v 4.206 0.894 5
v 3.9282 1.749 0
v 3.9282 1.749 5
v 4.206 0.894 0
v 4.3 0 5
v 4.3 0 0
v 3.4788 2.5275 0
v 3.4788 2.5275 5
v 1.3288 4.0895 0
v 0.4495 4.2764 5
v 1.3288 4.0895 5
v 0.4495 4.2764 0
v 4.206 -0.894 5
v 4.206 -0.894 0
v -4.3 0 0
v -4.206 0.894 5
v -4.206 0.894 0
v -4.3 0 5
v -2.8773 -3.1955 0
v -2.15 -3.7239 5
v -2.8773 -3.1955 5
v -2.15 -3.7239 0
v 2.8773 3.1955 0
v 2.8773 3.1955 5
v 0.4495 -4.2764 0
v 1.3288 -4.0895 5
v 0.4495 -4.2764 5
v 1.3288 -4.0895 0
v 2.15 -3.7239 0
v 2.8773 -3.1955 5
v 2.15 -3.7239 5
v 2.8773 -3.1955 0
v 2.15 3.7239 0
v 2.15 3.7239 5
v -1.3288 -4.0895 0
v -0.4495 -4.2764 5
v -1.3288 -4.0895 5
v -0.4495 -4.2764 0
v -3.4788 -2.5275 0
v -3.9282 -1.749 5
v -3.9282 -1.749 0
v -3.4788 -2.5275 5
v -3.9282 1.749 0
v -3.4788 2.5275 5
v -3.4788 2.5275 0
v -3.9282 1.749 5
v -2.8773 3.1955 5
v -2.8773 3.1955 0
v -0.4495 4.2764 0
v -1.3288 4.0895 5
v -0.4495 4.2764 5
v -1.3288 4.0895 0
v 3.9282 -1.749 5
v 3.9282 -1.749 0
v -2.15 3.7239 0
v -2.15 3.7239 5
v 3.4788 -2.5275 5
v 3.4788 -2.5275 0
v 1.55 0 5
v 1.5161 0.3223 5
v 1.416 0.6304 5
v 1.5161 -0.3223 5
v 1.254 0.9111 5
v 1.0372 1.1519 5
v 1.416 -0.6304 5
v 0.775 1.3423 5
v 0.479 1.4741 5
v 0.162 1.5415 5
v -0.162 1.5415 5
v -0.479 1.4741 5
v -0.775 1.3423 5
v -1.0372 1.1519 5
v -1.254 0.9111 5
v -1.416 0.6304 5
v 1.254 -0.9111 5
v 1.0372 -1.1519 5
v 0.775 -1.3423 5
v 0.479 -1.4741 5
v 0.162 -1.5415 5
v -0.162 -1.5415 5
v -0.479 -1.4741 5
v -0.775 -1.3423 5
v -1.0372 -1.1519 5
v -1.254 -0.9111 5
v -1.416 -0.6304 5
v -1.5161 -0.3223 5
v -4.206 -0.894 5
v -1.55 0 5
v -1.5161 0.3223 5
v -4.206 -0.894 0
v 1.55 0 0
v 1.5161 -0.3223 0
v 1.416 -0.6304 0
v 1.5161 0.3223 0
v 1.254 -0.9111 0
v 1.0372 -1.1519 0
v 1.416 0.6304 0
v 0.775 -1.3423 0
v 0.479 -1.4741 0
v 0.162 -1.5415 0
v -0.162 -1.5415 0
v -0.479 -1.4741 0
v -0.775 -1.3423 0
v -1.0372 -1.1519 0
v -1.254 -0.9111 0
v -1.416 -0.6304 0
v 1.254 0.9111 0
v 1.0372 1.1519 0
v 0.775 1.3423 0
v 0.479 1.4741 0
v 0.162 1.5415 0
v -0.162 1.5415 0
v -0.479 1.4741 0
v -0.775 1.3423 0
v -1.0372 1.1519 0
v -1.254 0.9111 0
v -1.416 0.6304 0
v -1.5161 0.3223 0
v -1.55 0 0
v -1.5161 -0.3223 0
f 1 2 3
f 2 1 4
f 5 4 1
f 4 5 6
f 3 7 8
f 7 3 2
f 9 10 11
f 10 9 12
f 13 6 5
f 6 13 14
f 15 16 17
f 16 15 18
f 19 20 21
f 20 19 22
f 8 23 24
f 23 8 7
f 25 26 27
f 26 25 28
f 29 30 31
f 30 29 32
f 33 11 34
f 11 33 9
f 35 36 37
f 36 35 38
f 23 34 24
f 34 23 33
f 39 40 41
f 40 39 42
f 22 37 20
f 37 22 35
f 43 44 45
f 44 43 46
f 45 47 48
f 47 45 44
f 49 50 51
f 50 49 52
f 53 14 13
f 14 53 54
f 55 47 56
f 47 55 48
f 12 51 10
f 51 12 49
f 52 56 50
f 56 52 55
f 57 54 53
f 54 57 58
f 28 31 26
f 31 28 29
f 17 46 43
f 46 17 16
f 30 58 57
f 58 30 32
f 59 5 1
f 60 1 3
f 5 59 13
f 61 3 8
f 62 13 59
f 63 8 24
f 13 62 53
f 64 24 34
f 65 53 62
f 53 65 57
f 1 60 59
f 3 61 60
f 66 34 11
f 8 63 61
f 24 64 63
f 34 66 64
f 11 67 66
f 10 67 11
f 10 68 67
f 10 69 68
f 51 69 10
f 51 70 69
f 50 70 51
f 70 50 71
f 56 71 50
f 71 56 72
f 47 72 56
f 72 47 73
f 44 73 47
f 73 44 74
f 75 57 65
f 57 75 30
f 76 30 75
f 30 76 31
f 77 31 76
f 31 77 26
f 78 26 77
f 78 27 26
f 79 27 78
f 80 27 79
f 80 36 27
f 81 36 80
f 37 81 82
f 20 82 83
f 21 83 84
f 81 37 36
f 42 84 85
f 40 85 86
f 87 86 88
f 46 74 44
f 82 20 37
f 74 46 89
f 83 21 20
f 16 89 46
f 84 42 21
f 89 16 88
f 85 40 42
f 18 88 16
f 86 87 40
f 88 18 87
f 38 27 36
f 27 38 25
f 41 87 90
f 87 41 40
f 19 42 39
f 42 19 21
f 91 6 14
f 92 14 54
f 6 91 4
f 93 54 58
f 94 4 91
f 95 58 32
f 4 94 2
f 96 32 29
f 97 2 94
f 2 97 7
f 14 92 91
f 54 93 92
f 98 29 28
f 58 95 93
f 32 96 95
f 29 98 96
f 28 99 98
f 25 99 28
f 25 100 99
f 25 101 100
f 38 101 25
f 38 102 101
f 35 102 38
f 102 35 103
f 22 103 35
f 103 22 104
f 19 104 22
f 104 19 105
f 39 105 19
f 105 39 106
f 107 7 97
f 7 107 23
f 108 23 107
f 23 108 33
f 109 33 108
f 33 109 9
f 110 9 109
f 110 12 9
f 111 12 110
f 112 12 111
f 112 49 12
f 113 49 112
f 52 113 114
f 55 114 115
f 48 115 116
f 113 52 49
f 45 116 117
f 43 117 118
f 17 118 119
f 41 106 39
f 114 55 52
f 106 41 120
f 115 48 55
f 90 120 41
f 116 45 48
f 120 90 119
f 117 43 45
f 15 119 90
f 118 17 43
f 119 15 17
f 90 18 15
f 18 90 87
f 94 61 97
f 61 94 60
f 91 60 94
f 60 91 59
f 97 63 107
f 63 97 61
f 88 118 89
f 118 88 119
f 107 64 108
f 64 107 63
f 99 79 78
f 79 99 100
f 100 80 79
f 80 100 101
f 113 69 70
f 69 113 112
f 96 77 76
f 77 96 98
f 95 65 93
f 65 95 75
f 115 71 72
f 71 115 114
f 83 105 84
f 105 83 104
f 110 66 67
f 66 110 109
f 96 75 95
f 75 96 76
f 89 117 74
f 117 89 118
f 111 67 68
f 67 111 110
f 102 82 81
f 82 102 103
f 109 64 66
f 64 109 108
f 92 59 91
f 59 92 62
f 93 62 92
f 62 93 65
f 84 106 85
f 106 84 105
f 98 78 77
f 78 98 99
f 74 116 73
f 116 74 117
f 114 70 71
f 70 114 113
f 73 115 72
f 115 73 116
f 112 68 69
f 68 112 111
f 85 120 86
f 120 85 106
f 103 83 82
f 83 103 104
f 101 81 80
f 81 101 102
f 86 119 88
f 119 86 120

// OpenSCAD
// file: ../parameters.scad
maximum_printable_size = 150;

layer_thickness = 0.3;
global_clearance = 0.5;


//Screw diameter and nut for M10 [mm]
M10_screw_diameter = 10.4;
M10_head_height = 10;
M10_head_diameter = 16+0.5;
M10_nut_height = 10.5;
M10_nut_diameter = 25.5;
M10_nut_pocket = 22.3;

//Screw diameter for M8 [mm]
M8_screw_diameter = 8.6;
M8_head_height = 8;
M8_head_diameter = 13.5;
M8_nut_height = 7.5;
M8_square_nut_thin_height = 4.5;
M8_nut_diameter = 14.4 + 0.5;
M8_nut_pocket = 13 + 0.5;
M8_washer_diameter = 16;
M8_washer_thickness = 1.5;


//Screw diameter and nut for M6 [mm]
M6_screw_diameter=6.5;
M6_head_diameter = 10+0.5;
M6_head_height = 6;
M6_nut_height = 4.9;
M6_nut_diameter = 11.8;
M6_nut_pocket = 10.4;
M6_square_nut_height = 3;
M6_square_nut_diameter = 10;
M6_washer_thickness = 1.6;

//Screw diameter and nut for M5 [mm]
M5_screw_diameter=5.5;
M5_head_height = 5;
M5_head_diameter = 13+0.5;
M5_nut_height = 4.5;
M5_nut_diameter = 9.4;
M5_nut_pocket = 8.4;

//Screw diameter and nut for M4 [mm]
M4_screw_diameter=4.5;
M4_screw_head_height = 4;
M4_nut_height = 3.2;
M4_nut_diameter = 8.4;
M4_nut_pocket = 7.5;

//Screw diameter and nut for M3 [mm]
M3_screw_diameter = 3.2;
M3_nut_height = 2.7;
M3_nut_diameter = 6.6;
M3_nut_pocket = 5.6;
M3_screw_head_height = 3;

//Screw diameter and nut for M2,5 [mm]
M2_5_screw_diameter = 2.7;
M2_5_nut_height = 2.3;
M2_5_nut_diameter = 6;
M2_5_nut_pocket = 5.5;

// kulove lozisko

bearing_efsm_08_h = 33+1;
bearing_efsm_08_m = 22;
bearing_efsm_08_db = 18;
bearing_efsm_08_ag = 10.5;
bearing_efsm_08_n = M4_screw_diameter;
bearing_efsm_08_a1 = 5.5;
bearing_efsm_08_d = 8.25;
bearing_efsm_08_B = 8; // ball height

bearing_efsm_10_h = 38+1;
bearing_efsm_10_m = 26;
bearing_efsm_10_db = 21.9;
bearing_efsm_10_ag = 12+0.2;
bearing_efsm_10_n = M5_screw_diameter;
bearing_efsm_10_a1 = 6.5;
bearing_efsm_10_d = 10.25;


bearing_efsm_12_width = 40+1;
bearing_efsm_12_h = bearing_efsm_12_width;
bearing_efsm_12_boltd = 28/2; // polovina vzdalenosti mezi srouby
bearing_efsm_12_m = bearing_efsm_12_boltd*2;
bearing_efsm_12_db = 25;
bearing_efsm_12_ag = 13;
bearing_efsm_12_a1 = 7;
bearing_efsm_12_n = M5_screw_diameter;
bearing_efsm_12_d = 12.15;
bearing_efsm_12_B = 10; // ball height
bearing_efsm_space = 1;

bearing_efsm_17_width = 54+1;
bearing_efsm_17_h = bearing_efsm_17_width;
bearing_efsm_17_boltd = 38/2; // polovina vzdalenosti mezi srouby
bearing_efsm_17_m = bearing_efsm_17_boltd*2;
bearing_efsm_17_db = 35;
bearing_efsm_17_ag = 18;
bearing_efsm_17_n = M6_screw_diameter;
bearing_efsm_17_a1 = 10;
bearing_efsm_17_B = 17; // ball height

//limcove lozisko
bearing_EFOM_10_L=26; //celkova sirka zakladny
bearing_EFOM_10_d1=10.3;//diametr otvoru real=10 mm
bearing_EFOM_10_dB=22;//diametr vystupku pro ulozeni lozika
bearing_EFOM_10_H=52;//celková delka zakladny
bearing_EFOM_10_J=36;// hole pitch
bearing_EFOM_10_A1=6.5;//vyska pouzdra
bearing_EFOM_10_Ag=12;//celkova vyska
bearing_EFOM_10_N1=5;//sirka otvoru pro sroub
bearing_EFOM_10_N2=8;//delka otvoru pro sroub
bearing_EFOM_10_m=36;//roztec der pro sroub
bearing_EFOM_10_h=9;//vyska lozika


608_bearing_outer_diameter = 22.3;
608_bearing_inner_diameter = 16;
608_bearing_thickness = 7.1;


// 20 KG servo parameters

servo_20kg_axis_offset = 9.375; // jak je osa mimo stredu
servo_20kg_body_x = 42;
servo_20kg_body_y = 21;
servo_20kg_body_z = 40;
servo_20kg_thread_x = 49/2;
servo_20kg_thread_y = 10/2;
servo_20kg_body_below = 10; // jak hluboko je tělo serva pod drzaky na srouby
servo_20kg_below = 25.8; // jak hluboko je páka serva pod drzaky na srouby

servo_20kg_bolt_d = 2.5+0.3;
servo_20kg_nut_d = 5+0.3;


//strain gauge
strain_gauge_width = 12.7;
strain_gauge_length = 75.1;
strain_gauge_screw_distance = 10;

//ALU profile
ALU_profile_width = 30.5;
ALU_profile_holder_wall_thickness = 3;
ALU_profile_groove_width = 8;

//pillow block bearing
//https://www.igus.eu/product/372
//Part no. KSTM-08
KSTM08_screws_distance = 33;         //m
KSTM08_screws_holes_diameter = 4.5;  //d2
KSTM08_flange_thickness = 6;         //h3
KSTM08_case_width = 9;               //C1
KSTM08_case_length = 47;             //a
KSTM08_ball_width = 12;              //B
KSTM08_ball_hole_diameter = 7.85;    //d1


//ložiska pro malý rotor
bearing_outer_diameter = 10.2;    // Rozměr B1 v nákresu s přídavkem na toleranci otvoru
bearing_thickness = 4;        // Rozměr B2 v nákresu
//bearing_shaft_length = 19.5;    // Rozměr B3 v nákresu, Originalni hodnota 19.5
bearing_shaft_length = 20;    // Rozměr B3 v nákresu


//simple platform parameters ////////////////////////////////////////////
front_holder_width = 160;
front_holder_angle = 25;
front_holder_height = 60;
front_holder_offset = 15;

// lock moving servo parameters
// static par.
servo_length = 23.1;
servo_width = 12.1;
servo_height = 26.7;
servo_axle_offset = 2.5;
servo_axle_height = 5;
servo_movement_angle = 40;
servo_movement_angle_offset = -10; // angle offset up
servo_force = 0.5; // [N/m] torque of servo

// dynamic par.
servo_arm_length = servo_width/2+ALU_profile_width/2+ALU_profile_holder_wall_thickness;
servo_travel_y = cos(servo_movement_angle)*servo_arm_length;
servo_arm_hole_length = (servo_arm_length/cos(servo_movement_angle+servo_movement_angle_offset))-servo_arm_length;
servo_joint_offset = sin(servo_movement_angle+servo_movement_angle_offset)*(servo_arm_length+servo_arm_hole_length+5);
servo_joint_offset_by_angle = -tan(servo_movement_angle_offset)*servo_arm_length;
servo_max_linear_force = servo_force/(servo_arm_length/1000); // max servo linear force [N]
servo_min_linear_force = cos(servo_movement_angle+abs(servo_movement_angle_offset))*servo_max_linear_force; // min servo linear force [N] in the most extreme position
servo_holding_linear_force = cos(servo_movement_angle+servo_movement_angle_offset)*servo_max_linear_force; // min servo linear force [N] in holding position

// lock static parameters
lock_screws_dia = 3.1;
lock_depth = 20;
lock_axle_diameter = 15;
lock_grab_axle_dia = 13;
lock_arms_joint_offset = 30;
lock_arms_joint_angle = 55;

// lock dynamic parameters
lock_push_force = (servo_holding_linear_force/cos(lock_arms_joint_angle))/cos(lock_arms_joint_angle); // lock arm pushing force on linear servo joint
lock_push_arm_length = tan(lock_arms_joint_angle)*lock_arms_joint_offset;
lock_arm_force_ratio = 1; // lock arm change holding force ratio (0.5 = arm will have half holding force)
lock_hold_arm_length = lock_push_arm_length/lock_arm_force_ratio;
lock_holding_force = lock_push_force*lock_arm_force_ratio;
lock_joint_arm_length = sqrt(pow(lock_push_arm_length, 2)+pow(lock_arms_joint_offset, 2));
// main file
include <../parameters.scad>


module 888_1007() {
	difference() {
		cylinder(d=M3_nut_diameter+2, h=5, $fn=30);

		translate([0, 0, -1])
		cylinder(d=lock_screws_dia, h=17, $fn=30);
	}
}

888_1007();
